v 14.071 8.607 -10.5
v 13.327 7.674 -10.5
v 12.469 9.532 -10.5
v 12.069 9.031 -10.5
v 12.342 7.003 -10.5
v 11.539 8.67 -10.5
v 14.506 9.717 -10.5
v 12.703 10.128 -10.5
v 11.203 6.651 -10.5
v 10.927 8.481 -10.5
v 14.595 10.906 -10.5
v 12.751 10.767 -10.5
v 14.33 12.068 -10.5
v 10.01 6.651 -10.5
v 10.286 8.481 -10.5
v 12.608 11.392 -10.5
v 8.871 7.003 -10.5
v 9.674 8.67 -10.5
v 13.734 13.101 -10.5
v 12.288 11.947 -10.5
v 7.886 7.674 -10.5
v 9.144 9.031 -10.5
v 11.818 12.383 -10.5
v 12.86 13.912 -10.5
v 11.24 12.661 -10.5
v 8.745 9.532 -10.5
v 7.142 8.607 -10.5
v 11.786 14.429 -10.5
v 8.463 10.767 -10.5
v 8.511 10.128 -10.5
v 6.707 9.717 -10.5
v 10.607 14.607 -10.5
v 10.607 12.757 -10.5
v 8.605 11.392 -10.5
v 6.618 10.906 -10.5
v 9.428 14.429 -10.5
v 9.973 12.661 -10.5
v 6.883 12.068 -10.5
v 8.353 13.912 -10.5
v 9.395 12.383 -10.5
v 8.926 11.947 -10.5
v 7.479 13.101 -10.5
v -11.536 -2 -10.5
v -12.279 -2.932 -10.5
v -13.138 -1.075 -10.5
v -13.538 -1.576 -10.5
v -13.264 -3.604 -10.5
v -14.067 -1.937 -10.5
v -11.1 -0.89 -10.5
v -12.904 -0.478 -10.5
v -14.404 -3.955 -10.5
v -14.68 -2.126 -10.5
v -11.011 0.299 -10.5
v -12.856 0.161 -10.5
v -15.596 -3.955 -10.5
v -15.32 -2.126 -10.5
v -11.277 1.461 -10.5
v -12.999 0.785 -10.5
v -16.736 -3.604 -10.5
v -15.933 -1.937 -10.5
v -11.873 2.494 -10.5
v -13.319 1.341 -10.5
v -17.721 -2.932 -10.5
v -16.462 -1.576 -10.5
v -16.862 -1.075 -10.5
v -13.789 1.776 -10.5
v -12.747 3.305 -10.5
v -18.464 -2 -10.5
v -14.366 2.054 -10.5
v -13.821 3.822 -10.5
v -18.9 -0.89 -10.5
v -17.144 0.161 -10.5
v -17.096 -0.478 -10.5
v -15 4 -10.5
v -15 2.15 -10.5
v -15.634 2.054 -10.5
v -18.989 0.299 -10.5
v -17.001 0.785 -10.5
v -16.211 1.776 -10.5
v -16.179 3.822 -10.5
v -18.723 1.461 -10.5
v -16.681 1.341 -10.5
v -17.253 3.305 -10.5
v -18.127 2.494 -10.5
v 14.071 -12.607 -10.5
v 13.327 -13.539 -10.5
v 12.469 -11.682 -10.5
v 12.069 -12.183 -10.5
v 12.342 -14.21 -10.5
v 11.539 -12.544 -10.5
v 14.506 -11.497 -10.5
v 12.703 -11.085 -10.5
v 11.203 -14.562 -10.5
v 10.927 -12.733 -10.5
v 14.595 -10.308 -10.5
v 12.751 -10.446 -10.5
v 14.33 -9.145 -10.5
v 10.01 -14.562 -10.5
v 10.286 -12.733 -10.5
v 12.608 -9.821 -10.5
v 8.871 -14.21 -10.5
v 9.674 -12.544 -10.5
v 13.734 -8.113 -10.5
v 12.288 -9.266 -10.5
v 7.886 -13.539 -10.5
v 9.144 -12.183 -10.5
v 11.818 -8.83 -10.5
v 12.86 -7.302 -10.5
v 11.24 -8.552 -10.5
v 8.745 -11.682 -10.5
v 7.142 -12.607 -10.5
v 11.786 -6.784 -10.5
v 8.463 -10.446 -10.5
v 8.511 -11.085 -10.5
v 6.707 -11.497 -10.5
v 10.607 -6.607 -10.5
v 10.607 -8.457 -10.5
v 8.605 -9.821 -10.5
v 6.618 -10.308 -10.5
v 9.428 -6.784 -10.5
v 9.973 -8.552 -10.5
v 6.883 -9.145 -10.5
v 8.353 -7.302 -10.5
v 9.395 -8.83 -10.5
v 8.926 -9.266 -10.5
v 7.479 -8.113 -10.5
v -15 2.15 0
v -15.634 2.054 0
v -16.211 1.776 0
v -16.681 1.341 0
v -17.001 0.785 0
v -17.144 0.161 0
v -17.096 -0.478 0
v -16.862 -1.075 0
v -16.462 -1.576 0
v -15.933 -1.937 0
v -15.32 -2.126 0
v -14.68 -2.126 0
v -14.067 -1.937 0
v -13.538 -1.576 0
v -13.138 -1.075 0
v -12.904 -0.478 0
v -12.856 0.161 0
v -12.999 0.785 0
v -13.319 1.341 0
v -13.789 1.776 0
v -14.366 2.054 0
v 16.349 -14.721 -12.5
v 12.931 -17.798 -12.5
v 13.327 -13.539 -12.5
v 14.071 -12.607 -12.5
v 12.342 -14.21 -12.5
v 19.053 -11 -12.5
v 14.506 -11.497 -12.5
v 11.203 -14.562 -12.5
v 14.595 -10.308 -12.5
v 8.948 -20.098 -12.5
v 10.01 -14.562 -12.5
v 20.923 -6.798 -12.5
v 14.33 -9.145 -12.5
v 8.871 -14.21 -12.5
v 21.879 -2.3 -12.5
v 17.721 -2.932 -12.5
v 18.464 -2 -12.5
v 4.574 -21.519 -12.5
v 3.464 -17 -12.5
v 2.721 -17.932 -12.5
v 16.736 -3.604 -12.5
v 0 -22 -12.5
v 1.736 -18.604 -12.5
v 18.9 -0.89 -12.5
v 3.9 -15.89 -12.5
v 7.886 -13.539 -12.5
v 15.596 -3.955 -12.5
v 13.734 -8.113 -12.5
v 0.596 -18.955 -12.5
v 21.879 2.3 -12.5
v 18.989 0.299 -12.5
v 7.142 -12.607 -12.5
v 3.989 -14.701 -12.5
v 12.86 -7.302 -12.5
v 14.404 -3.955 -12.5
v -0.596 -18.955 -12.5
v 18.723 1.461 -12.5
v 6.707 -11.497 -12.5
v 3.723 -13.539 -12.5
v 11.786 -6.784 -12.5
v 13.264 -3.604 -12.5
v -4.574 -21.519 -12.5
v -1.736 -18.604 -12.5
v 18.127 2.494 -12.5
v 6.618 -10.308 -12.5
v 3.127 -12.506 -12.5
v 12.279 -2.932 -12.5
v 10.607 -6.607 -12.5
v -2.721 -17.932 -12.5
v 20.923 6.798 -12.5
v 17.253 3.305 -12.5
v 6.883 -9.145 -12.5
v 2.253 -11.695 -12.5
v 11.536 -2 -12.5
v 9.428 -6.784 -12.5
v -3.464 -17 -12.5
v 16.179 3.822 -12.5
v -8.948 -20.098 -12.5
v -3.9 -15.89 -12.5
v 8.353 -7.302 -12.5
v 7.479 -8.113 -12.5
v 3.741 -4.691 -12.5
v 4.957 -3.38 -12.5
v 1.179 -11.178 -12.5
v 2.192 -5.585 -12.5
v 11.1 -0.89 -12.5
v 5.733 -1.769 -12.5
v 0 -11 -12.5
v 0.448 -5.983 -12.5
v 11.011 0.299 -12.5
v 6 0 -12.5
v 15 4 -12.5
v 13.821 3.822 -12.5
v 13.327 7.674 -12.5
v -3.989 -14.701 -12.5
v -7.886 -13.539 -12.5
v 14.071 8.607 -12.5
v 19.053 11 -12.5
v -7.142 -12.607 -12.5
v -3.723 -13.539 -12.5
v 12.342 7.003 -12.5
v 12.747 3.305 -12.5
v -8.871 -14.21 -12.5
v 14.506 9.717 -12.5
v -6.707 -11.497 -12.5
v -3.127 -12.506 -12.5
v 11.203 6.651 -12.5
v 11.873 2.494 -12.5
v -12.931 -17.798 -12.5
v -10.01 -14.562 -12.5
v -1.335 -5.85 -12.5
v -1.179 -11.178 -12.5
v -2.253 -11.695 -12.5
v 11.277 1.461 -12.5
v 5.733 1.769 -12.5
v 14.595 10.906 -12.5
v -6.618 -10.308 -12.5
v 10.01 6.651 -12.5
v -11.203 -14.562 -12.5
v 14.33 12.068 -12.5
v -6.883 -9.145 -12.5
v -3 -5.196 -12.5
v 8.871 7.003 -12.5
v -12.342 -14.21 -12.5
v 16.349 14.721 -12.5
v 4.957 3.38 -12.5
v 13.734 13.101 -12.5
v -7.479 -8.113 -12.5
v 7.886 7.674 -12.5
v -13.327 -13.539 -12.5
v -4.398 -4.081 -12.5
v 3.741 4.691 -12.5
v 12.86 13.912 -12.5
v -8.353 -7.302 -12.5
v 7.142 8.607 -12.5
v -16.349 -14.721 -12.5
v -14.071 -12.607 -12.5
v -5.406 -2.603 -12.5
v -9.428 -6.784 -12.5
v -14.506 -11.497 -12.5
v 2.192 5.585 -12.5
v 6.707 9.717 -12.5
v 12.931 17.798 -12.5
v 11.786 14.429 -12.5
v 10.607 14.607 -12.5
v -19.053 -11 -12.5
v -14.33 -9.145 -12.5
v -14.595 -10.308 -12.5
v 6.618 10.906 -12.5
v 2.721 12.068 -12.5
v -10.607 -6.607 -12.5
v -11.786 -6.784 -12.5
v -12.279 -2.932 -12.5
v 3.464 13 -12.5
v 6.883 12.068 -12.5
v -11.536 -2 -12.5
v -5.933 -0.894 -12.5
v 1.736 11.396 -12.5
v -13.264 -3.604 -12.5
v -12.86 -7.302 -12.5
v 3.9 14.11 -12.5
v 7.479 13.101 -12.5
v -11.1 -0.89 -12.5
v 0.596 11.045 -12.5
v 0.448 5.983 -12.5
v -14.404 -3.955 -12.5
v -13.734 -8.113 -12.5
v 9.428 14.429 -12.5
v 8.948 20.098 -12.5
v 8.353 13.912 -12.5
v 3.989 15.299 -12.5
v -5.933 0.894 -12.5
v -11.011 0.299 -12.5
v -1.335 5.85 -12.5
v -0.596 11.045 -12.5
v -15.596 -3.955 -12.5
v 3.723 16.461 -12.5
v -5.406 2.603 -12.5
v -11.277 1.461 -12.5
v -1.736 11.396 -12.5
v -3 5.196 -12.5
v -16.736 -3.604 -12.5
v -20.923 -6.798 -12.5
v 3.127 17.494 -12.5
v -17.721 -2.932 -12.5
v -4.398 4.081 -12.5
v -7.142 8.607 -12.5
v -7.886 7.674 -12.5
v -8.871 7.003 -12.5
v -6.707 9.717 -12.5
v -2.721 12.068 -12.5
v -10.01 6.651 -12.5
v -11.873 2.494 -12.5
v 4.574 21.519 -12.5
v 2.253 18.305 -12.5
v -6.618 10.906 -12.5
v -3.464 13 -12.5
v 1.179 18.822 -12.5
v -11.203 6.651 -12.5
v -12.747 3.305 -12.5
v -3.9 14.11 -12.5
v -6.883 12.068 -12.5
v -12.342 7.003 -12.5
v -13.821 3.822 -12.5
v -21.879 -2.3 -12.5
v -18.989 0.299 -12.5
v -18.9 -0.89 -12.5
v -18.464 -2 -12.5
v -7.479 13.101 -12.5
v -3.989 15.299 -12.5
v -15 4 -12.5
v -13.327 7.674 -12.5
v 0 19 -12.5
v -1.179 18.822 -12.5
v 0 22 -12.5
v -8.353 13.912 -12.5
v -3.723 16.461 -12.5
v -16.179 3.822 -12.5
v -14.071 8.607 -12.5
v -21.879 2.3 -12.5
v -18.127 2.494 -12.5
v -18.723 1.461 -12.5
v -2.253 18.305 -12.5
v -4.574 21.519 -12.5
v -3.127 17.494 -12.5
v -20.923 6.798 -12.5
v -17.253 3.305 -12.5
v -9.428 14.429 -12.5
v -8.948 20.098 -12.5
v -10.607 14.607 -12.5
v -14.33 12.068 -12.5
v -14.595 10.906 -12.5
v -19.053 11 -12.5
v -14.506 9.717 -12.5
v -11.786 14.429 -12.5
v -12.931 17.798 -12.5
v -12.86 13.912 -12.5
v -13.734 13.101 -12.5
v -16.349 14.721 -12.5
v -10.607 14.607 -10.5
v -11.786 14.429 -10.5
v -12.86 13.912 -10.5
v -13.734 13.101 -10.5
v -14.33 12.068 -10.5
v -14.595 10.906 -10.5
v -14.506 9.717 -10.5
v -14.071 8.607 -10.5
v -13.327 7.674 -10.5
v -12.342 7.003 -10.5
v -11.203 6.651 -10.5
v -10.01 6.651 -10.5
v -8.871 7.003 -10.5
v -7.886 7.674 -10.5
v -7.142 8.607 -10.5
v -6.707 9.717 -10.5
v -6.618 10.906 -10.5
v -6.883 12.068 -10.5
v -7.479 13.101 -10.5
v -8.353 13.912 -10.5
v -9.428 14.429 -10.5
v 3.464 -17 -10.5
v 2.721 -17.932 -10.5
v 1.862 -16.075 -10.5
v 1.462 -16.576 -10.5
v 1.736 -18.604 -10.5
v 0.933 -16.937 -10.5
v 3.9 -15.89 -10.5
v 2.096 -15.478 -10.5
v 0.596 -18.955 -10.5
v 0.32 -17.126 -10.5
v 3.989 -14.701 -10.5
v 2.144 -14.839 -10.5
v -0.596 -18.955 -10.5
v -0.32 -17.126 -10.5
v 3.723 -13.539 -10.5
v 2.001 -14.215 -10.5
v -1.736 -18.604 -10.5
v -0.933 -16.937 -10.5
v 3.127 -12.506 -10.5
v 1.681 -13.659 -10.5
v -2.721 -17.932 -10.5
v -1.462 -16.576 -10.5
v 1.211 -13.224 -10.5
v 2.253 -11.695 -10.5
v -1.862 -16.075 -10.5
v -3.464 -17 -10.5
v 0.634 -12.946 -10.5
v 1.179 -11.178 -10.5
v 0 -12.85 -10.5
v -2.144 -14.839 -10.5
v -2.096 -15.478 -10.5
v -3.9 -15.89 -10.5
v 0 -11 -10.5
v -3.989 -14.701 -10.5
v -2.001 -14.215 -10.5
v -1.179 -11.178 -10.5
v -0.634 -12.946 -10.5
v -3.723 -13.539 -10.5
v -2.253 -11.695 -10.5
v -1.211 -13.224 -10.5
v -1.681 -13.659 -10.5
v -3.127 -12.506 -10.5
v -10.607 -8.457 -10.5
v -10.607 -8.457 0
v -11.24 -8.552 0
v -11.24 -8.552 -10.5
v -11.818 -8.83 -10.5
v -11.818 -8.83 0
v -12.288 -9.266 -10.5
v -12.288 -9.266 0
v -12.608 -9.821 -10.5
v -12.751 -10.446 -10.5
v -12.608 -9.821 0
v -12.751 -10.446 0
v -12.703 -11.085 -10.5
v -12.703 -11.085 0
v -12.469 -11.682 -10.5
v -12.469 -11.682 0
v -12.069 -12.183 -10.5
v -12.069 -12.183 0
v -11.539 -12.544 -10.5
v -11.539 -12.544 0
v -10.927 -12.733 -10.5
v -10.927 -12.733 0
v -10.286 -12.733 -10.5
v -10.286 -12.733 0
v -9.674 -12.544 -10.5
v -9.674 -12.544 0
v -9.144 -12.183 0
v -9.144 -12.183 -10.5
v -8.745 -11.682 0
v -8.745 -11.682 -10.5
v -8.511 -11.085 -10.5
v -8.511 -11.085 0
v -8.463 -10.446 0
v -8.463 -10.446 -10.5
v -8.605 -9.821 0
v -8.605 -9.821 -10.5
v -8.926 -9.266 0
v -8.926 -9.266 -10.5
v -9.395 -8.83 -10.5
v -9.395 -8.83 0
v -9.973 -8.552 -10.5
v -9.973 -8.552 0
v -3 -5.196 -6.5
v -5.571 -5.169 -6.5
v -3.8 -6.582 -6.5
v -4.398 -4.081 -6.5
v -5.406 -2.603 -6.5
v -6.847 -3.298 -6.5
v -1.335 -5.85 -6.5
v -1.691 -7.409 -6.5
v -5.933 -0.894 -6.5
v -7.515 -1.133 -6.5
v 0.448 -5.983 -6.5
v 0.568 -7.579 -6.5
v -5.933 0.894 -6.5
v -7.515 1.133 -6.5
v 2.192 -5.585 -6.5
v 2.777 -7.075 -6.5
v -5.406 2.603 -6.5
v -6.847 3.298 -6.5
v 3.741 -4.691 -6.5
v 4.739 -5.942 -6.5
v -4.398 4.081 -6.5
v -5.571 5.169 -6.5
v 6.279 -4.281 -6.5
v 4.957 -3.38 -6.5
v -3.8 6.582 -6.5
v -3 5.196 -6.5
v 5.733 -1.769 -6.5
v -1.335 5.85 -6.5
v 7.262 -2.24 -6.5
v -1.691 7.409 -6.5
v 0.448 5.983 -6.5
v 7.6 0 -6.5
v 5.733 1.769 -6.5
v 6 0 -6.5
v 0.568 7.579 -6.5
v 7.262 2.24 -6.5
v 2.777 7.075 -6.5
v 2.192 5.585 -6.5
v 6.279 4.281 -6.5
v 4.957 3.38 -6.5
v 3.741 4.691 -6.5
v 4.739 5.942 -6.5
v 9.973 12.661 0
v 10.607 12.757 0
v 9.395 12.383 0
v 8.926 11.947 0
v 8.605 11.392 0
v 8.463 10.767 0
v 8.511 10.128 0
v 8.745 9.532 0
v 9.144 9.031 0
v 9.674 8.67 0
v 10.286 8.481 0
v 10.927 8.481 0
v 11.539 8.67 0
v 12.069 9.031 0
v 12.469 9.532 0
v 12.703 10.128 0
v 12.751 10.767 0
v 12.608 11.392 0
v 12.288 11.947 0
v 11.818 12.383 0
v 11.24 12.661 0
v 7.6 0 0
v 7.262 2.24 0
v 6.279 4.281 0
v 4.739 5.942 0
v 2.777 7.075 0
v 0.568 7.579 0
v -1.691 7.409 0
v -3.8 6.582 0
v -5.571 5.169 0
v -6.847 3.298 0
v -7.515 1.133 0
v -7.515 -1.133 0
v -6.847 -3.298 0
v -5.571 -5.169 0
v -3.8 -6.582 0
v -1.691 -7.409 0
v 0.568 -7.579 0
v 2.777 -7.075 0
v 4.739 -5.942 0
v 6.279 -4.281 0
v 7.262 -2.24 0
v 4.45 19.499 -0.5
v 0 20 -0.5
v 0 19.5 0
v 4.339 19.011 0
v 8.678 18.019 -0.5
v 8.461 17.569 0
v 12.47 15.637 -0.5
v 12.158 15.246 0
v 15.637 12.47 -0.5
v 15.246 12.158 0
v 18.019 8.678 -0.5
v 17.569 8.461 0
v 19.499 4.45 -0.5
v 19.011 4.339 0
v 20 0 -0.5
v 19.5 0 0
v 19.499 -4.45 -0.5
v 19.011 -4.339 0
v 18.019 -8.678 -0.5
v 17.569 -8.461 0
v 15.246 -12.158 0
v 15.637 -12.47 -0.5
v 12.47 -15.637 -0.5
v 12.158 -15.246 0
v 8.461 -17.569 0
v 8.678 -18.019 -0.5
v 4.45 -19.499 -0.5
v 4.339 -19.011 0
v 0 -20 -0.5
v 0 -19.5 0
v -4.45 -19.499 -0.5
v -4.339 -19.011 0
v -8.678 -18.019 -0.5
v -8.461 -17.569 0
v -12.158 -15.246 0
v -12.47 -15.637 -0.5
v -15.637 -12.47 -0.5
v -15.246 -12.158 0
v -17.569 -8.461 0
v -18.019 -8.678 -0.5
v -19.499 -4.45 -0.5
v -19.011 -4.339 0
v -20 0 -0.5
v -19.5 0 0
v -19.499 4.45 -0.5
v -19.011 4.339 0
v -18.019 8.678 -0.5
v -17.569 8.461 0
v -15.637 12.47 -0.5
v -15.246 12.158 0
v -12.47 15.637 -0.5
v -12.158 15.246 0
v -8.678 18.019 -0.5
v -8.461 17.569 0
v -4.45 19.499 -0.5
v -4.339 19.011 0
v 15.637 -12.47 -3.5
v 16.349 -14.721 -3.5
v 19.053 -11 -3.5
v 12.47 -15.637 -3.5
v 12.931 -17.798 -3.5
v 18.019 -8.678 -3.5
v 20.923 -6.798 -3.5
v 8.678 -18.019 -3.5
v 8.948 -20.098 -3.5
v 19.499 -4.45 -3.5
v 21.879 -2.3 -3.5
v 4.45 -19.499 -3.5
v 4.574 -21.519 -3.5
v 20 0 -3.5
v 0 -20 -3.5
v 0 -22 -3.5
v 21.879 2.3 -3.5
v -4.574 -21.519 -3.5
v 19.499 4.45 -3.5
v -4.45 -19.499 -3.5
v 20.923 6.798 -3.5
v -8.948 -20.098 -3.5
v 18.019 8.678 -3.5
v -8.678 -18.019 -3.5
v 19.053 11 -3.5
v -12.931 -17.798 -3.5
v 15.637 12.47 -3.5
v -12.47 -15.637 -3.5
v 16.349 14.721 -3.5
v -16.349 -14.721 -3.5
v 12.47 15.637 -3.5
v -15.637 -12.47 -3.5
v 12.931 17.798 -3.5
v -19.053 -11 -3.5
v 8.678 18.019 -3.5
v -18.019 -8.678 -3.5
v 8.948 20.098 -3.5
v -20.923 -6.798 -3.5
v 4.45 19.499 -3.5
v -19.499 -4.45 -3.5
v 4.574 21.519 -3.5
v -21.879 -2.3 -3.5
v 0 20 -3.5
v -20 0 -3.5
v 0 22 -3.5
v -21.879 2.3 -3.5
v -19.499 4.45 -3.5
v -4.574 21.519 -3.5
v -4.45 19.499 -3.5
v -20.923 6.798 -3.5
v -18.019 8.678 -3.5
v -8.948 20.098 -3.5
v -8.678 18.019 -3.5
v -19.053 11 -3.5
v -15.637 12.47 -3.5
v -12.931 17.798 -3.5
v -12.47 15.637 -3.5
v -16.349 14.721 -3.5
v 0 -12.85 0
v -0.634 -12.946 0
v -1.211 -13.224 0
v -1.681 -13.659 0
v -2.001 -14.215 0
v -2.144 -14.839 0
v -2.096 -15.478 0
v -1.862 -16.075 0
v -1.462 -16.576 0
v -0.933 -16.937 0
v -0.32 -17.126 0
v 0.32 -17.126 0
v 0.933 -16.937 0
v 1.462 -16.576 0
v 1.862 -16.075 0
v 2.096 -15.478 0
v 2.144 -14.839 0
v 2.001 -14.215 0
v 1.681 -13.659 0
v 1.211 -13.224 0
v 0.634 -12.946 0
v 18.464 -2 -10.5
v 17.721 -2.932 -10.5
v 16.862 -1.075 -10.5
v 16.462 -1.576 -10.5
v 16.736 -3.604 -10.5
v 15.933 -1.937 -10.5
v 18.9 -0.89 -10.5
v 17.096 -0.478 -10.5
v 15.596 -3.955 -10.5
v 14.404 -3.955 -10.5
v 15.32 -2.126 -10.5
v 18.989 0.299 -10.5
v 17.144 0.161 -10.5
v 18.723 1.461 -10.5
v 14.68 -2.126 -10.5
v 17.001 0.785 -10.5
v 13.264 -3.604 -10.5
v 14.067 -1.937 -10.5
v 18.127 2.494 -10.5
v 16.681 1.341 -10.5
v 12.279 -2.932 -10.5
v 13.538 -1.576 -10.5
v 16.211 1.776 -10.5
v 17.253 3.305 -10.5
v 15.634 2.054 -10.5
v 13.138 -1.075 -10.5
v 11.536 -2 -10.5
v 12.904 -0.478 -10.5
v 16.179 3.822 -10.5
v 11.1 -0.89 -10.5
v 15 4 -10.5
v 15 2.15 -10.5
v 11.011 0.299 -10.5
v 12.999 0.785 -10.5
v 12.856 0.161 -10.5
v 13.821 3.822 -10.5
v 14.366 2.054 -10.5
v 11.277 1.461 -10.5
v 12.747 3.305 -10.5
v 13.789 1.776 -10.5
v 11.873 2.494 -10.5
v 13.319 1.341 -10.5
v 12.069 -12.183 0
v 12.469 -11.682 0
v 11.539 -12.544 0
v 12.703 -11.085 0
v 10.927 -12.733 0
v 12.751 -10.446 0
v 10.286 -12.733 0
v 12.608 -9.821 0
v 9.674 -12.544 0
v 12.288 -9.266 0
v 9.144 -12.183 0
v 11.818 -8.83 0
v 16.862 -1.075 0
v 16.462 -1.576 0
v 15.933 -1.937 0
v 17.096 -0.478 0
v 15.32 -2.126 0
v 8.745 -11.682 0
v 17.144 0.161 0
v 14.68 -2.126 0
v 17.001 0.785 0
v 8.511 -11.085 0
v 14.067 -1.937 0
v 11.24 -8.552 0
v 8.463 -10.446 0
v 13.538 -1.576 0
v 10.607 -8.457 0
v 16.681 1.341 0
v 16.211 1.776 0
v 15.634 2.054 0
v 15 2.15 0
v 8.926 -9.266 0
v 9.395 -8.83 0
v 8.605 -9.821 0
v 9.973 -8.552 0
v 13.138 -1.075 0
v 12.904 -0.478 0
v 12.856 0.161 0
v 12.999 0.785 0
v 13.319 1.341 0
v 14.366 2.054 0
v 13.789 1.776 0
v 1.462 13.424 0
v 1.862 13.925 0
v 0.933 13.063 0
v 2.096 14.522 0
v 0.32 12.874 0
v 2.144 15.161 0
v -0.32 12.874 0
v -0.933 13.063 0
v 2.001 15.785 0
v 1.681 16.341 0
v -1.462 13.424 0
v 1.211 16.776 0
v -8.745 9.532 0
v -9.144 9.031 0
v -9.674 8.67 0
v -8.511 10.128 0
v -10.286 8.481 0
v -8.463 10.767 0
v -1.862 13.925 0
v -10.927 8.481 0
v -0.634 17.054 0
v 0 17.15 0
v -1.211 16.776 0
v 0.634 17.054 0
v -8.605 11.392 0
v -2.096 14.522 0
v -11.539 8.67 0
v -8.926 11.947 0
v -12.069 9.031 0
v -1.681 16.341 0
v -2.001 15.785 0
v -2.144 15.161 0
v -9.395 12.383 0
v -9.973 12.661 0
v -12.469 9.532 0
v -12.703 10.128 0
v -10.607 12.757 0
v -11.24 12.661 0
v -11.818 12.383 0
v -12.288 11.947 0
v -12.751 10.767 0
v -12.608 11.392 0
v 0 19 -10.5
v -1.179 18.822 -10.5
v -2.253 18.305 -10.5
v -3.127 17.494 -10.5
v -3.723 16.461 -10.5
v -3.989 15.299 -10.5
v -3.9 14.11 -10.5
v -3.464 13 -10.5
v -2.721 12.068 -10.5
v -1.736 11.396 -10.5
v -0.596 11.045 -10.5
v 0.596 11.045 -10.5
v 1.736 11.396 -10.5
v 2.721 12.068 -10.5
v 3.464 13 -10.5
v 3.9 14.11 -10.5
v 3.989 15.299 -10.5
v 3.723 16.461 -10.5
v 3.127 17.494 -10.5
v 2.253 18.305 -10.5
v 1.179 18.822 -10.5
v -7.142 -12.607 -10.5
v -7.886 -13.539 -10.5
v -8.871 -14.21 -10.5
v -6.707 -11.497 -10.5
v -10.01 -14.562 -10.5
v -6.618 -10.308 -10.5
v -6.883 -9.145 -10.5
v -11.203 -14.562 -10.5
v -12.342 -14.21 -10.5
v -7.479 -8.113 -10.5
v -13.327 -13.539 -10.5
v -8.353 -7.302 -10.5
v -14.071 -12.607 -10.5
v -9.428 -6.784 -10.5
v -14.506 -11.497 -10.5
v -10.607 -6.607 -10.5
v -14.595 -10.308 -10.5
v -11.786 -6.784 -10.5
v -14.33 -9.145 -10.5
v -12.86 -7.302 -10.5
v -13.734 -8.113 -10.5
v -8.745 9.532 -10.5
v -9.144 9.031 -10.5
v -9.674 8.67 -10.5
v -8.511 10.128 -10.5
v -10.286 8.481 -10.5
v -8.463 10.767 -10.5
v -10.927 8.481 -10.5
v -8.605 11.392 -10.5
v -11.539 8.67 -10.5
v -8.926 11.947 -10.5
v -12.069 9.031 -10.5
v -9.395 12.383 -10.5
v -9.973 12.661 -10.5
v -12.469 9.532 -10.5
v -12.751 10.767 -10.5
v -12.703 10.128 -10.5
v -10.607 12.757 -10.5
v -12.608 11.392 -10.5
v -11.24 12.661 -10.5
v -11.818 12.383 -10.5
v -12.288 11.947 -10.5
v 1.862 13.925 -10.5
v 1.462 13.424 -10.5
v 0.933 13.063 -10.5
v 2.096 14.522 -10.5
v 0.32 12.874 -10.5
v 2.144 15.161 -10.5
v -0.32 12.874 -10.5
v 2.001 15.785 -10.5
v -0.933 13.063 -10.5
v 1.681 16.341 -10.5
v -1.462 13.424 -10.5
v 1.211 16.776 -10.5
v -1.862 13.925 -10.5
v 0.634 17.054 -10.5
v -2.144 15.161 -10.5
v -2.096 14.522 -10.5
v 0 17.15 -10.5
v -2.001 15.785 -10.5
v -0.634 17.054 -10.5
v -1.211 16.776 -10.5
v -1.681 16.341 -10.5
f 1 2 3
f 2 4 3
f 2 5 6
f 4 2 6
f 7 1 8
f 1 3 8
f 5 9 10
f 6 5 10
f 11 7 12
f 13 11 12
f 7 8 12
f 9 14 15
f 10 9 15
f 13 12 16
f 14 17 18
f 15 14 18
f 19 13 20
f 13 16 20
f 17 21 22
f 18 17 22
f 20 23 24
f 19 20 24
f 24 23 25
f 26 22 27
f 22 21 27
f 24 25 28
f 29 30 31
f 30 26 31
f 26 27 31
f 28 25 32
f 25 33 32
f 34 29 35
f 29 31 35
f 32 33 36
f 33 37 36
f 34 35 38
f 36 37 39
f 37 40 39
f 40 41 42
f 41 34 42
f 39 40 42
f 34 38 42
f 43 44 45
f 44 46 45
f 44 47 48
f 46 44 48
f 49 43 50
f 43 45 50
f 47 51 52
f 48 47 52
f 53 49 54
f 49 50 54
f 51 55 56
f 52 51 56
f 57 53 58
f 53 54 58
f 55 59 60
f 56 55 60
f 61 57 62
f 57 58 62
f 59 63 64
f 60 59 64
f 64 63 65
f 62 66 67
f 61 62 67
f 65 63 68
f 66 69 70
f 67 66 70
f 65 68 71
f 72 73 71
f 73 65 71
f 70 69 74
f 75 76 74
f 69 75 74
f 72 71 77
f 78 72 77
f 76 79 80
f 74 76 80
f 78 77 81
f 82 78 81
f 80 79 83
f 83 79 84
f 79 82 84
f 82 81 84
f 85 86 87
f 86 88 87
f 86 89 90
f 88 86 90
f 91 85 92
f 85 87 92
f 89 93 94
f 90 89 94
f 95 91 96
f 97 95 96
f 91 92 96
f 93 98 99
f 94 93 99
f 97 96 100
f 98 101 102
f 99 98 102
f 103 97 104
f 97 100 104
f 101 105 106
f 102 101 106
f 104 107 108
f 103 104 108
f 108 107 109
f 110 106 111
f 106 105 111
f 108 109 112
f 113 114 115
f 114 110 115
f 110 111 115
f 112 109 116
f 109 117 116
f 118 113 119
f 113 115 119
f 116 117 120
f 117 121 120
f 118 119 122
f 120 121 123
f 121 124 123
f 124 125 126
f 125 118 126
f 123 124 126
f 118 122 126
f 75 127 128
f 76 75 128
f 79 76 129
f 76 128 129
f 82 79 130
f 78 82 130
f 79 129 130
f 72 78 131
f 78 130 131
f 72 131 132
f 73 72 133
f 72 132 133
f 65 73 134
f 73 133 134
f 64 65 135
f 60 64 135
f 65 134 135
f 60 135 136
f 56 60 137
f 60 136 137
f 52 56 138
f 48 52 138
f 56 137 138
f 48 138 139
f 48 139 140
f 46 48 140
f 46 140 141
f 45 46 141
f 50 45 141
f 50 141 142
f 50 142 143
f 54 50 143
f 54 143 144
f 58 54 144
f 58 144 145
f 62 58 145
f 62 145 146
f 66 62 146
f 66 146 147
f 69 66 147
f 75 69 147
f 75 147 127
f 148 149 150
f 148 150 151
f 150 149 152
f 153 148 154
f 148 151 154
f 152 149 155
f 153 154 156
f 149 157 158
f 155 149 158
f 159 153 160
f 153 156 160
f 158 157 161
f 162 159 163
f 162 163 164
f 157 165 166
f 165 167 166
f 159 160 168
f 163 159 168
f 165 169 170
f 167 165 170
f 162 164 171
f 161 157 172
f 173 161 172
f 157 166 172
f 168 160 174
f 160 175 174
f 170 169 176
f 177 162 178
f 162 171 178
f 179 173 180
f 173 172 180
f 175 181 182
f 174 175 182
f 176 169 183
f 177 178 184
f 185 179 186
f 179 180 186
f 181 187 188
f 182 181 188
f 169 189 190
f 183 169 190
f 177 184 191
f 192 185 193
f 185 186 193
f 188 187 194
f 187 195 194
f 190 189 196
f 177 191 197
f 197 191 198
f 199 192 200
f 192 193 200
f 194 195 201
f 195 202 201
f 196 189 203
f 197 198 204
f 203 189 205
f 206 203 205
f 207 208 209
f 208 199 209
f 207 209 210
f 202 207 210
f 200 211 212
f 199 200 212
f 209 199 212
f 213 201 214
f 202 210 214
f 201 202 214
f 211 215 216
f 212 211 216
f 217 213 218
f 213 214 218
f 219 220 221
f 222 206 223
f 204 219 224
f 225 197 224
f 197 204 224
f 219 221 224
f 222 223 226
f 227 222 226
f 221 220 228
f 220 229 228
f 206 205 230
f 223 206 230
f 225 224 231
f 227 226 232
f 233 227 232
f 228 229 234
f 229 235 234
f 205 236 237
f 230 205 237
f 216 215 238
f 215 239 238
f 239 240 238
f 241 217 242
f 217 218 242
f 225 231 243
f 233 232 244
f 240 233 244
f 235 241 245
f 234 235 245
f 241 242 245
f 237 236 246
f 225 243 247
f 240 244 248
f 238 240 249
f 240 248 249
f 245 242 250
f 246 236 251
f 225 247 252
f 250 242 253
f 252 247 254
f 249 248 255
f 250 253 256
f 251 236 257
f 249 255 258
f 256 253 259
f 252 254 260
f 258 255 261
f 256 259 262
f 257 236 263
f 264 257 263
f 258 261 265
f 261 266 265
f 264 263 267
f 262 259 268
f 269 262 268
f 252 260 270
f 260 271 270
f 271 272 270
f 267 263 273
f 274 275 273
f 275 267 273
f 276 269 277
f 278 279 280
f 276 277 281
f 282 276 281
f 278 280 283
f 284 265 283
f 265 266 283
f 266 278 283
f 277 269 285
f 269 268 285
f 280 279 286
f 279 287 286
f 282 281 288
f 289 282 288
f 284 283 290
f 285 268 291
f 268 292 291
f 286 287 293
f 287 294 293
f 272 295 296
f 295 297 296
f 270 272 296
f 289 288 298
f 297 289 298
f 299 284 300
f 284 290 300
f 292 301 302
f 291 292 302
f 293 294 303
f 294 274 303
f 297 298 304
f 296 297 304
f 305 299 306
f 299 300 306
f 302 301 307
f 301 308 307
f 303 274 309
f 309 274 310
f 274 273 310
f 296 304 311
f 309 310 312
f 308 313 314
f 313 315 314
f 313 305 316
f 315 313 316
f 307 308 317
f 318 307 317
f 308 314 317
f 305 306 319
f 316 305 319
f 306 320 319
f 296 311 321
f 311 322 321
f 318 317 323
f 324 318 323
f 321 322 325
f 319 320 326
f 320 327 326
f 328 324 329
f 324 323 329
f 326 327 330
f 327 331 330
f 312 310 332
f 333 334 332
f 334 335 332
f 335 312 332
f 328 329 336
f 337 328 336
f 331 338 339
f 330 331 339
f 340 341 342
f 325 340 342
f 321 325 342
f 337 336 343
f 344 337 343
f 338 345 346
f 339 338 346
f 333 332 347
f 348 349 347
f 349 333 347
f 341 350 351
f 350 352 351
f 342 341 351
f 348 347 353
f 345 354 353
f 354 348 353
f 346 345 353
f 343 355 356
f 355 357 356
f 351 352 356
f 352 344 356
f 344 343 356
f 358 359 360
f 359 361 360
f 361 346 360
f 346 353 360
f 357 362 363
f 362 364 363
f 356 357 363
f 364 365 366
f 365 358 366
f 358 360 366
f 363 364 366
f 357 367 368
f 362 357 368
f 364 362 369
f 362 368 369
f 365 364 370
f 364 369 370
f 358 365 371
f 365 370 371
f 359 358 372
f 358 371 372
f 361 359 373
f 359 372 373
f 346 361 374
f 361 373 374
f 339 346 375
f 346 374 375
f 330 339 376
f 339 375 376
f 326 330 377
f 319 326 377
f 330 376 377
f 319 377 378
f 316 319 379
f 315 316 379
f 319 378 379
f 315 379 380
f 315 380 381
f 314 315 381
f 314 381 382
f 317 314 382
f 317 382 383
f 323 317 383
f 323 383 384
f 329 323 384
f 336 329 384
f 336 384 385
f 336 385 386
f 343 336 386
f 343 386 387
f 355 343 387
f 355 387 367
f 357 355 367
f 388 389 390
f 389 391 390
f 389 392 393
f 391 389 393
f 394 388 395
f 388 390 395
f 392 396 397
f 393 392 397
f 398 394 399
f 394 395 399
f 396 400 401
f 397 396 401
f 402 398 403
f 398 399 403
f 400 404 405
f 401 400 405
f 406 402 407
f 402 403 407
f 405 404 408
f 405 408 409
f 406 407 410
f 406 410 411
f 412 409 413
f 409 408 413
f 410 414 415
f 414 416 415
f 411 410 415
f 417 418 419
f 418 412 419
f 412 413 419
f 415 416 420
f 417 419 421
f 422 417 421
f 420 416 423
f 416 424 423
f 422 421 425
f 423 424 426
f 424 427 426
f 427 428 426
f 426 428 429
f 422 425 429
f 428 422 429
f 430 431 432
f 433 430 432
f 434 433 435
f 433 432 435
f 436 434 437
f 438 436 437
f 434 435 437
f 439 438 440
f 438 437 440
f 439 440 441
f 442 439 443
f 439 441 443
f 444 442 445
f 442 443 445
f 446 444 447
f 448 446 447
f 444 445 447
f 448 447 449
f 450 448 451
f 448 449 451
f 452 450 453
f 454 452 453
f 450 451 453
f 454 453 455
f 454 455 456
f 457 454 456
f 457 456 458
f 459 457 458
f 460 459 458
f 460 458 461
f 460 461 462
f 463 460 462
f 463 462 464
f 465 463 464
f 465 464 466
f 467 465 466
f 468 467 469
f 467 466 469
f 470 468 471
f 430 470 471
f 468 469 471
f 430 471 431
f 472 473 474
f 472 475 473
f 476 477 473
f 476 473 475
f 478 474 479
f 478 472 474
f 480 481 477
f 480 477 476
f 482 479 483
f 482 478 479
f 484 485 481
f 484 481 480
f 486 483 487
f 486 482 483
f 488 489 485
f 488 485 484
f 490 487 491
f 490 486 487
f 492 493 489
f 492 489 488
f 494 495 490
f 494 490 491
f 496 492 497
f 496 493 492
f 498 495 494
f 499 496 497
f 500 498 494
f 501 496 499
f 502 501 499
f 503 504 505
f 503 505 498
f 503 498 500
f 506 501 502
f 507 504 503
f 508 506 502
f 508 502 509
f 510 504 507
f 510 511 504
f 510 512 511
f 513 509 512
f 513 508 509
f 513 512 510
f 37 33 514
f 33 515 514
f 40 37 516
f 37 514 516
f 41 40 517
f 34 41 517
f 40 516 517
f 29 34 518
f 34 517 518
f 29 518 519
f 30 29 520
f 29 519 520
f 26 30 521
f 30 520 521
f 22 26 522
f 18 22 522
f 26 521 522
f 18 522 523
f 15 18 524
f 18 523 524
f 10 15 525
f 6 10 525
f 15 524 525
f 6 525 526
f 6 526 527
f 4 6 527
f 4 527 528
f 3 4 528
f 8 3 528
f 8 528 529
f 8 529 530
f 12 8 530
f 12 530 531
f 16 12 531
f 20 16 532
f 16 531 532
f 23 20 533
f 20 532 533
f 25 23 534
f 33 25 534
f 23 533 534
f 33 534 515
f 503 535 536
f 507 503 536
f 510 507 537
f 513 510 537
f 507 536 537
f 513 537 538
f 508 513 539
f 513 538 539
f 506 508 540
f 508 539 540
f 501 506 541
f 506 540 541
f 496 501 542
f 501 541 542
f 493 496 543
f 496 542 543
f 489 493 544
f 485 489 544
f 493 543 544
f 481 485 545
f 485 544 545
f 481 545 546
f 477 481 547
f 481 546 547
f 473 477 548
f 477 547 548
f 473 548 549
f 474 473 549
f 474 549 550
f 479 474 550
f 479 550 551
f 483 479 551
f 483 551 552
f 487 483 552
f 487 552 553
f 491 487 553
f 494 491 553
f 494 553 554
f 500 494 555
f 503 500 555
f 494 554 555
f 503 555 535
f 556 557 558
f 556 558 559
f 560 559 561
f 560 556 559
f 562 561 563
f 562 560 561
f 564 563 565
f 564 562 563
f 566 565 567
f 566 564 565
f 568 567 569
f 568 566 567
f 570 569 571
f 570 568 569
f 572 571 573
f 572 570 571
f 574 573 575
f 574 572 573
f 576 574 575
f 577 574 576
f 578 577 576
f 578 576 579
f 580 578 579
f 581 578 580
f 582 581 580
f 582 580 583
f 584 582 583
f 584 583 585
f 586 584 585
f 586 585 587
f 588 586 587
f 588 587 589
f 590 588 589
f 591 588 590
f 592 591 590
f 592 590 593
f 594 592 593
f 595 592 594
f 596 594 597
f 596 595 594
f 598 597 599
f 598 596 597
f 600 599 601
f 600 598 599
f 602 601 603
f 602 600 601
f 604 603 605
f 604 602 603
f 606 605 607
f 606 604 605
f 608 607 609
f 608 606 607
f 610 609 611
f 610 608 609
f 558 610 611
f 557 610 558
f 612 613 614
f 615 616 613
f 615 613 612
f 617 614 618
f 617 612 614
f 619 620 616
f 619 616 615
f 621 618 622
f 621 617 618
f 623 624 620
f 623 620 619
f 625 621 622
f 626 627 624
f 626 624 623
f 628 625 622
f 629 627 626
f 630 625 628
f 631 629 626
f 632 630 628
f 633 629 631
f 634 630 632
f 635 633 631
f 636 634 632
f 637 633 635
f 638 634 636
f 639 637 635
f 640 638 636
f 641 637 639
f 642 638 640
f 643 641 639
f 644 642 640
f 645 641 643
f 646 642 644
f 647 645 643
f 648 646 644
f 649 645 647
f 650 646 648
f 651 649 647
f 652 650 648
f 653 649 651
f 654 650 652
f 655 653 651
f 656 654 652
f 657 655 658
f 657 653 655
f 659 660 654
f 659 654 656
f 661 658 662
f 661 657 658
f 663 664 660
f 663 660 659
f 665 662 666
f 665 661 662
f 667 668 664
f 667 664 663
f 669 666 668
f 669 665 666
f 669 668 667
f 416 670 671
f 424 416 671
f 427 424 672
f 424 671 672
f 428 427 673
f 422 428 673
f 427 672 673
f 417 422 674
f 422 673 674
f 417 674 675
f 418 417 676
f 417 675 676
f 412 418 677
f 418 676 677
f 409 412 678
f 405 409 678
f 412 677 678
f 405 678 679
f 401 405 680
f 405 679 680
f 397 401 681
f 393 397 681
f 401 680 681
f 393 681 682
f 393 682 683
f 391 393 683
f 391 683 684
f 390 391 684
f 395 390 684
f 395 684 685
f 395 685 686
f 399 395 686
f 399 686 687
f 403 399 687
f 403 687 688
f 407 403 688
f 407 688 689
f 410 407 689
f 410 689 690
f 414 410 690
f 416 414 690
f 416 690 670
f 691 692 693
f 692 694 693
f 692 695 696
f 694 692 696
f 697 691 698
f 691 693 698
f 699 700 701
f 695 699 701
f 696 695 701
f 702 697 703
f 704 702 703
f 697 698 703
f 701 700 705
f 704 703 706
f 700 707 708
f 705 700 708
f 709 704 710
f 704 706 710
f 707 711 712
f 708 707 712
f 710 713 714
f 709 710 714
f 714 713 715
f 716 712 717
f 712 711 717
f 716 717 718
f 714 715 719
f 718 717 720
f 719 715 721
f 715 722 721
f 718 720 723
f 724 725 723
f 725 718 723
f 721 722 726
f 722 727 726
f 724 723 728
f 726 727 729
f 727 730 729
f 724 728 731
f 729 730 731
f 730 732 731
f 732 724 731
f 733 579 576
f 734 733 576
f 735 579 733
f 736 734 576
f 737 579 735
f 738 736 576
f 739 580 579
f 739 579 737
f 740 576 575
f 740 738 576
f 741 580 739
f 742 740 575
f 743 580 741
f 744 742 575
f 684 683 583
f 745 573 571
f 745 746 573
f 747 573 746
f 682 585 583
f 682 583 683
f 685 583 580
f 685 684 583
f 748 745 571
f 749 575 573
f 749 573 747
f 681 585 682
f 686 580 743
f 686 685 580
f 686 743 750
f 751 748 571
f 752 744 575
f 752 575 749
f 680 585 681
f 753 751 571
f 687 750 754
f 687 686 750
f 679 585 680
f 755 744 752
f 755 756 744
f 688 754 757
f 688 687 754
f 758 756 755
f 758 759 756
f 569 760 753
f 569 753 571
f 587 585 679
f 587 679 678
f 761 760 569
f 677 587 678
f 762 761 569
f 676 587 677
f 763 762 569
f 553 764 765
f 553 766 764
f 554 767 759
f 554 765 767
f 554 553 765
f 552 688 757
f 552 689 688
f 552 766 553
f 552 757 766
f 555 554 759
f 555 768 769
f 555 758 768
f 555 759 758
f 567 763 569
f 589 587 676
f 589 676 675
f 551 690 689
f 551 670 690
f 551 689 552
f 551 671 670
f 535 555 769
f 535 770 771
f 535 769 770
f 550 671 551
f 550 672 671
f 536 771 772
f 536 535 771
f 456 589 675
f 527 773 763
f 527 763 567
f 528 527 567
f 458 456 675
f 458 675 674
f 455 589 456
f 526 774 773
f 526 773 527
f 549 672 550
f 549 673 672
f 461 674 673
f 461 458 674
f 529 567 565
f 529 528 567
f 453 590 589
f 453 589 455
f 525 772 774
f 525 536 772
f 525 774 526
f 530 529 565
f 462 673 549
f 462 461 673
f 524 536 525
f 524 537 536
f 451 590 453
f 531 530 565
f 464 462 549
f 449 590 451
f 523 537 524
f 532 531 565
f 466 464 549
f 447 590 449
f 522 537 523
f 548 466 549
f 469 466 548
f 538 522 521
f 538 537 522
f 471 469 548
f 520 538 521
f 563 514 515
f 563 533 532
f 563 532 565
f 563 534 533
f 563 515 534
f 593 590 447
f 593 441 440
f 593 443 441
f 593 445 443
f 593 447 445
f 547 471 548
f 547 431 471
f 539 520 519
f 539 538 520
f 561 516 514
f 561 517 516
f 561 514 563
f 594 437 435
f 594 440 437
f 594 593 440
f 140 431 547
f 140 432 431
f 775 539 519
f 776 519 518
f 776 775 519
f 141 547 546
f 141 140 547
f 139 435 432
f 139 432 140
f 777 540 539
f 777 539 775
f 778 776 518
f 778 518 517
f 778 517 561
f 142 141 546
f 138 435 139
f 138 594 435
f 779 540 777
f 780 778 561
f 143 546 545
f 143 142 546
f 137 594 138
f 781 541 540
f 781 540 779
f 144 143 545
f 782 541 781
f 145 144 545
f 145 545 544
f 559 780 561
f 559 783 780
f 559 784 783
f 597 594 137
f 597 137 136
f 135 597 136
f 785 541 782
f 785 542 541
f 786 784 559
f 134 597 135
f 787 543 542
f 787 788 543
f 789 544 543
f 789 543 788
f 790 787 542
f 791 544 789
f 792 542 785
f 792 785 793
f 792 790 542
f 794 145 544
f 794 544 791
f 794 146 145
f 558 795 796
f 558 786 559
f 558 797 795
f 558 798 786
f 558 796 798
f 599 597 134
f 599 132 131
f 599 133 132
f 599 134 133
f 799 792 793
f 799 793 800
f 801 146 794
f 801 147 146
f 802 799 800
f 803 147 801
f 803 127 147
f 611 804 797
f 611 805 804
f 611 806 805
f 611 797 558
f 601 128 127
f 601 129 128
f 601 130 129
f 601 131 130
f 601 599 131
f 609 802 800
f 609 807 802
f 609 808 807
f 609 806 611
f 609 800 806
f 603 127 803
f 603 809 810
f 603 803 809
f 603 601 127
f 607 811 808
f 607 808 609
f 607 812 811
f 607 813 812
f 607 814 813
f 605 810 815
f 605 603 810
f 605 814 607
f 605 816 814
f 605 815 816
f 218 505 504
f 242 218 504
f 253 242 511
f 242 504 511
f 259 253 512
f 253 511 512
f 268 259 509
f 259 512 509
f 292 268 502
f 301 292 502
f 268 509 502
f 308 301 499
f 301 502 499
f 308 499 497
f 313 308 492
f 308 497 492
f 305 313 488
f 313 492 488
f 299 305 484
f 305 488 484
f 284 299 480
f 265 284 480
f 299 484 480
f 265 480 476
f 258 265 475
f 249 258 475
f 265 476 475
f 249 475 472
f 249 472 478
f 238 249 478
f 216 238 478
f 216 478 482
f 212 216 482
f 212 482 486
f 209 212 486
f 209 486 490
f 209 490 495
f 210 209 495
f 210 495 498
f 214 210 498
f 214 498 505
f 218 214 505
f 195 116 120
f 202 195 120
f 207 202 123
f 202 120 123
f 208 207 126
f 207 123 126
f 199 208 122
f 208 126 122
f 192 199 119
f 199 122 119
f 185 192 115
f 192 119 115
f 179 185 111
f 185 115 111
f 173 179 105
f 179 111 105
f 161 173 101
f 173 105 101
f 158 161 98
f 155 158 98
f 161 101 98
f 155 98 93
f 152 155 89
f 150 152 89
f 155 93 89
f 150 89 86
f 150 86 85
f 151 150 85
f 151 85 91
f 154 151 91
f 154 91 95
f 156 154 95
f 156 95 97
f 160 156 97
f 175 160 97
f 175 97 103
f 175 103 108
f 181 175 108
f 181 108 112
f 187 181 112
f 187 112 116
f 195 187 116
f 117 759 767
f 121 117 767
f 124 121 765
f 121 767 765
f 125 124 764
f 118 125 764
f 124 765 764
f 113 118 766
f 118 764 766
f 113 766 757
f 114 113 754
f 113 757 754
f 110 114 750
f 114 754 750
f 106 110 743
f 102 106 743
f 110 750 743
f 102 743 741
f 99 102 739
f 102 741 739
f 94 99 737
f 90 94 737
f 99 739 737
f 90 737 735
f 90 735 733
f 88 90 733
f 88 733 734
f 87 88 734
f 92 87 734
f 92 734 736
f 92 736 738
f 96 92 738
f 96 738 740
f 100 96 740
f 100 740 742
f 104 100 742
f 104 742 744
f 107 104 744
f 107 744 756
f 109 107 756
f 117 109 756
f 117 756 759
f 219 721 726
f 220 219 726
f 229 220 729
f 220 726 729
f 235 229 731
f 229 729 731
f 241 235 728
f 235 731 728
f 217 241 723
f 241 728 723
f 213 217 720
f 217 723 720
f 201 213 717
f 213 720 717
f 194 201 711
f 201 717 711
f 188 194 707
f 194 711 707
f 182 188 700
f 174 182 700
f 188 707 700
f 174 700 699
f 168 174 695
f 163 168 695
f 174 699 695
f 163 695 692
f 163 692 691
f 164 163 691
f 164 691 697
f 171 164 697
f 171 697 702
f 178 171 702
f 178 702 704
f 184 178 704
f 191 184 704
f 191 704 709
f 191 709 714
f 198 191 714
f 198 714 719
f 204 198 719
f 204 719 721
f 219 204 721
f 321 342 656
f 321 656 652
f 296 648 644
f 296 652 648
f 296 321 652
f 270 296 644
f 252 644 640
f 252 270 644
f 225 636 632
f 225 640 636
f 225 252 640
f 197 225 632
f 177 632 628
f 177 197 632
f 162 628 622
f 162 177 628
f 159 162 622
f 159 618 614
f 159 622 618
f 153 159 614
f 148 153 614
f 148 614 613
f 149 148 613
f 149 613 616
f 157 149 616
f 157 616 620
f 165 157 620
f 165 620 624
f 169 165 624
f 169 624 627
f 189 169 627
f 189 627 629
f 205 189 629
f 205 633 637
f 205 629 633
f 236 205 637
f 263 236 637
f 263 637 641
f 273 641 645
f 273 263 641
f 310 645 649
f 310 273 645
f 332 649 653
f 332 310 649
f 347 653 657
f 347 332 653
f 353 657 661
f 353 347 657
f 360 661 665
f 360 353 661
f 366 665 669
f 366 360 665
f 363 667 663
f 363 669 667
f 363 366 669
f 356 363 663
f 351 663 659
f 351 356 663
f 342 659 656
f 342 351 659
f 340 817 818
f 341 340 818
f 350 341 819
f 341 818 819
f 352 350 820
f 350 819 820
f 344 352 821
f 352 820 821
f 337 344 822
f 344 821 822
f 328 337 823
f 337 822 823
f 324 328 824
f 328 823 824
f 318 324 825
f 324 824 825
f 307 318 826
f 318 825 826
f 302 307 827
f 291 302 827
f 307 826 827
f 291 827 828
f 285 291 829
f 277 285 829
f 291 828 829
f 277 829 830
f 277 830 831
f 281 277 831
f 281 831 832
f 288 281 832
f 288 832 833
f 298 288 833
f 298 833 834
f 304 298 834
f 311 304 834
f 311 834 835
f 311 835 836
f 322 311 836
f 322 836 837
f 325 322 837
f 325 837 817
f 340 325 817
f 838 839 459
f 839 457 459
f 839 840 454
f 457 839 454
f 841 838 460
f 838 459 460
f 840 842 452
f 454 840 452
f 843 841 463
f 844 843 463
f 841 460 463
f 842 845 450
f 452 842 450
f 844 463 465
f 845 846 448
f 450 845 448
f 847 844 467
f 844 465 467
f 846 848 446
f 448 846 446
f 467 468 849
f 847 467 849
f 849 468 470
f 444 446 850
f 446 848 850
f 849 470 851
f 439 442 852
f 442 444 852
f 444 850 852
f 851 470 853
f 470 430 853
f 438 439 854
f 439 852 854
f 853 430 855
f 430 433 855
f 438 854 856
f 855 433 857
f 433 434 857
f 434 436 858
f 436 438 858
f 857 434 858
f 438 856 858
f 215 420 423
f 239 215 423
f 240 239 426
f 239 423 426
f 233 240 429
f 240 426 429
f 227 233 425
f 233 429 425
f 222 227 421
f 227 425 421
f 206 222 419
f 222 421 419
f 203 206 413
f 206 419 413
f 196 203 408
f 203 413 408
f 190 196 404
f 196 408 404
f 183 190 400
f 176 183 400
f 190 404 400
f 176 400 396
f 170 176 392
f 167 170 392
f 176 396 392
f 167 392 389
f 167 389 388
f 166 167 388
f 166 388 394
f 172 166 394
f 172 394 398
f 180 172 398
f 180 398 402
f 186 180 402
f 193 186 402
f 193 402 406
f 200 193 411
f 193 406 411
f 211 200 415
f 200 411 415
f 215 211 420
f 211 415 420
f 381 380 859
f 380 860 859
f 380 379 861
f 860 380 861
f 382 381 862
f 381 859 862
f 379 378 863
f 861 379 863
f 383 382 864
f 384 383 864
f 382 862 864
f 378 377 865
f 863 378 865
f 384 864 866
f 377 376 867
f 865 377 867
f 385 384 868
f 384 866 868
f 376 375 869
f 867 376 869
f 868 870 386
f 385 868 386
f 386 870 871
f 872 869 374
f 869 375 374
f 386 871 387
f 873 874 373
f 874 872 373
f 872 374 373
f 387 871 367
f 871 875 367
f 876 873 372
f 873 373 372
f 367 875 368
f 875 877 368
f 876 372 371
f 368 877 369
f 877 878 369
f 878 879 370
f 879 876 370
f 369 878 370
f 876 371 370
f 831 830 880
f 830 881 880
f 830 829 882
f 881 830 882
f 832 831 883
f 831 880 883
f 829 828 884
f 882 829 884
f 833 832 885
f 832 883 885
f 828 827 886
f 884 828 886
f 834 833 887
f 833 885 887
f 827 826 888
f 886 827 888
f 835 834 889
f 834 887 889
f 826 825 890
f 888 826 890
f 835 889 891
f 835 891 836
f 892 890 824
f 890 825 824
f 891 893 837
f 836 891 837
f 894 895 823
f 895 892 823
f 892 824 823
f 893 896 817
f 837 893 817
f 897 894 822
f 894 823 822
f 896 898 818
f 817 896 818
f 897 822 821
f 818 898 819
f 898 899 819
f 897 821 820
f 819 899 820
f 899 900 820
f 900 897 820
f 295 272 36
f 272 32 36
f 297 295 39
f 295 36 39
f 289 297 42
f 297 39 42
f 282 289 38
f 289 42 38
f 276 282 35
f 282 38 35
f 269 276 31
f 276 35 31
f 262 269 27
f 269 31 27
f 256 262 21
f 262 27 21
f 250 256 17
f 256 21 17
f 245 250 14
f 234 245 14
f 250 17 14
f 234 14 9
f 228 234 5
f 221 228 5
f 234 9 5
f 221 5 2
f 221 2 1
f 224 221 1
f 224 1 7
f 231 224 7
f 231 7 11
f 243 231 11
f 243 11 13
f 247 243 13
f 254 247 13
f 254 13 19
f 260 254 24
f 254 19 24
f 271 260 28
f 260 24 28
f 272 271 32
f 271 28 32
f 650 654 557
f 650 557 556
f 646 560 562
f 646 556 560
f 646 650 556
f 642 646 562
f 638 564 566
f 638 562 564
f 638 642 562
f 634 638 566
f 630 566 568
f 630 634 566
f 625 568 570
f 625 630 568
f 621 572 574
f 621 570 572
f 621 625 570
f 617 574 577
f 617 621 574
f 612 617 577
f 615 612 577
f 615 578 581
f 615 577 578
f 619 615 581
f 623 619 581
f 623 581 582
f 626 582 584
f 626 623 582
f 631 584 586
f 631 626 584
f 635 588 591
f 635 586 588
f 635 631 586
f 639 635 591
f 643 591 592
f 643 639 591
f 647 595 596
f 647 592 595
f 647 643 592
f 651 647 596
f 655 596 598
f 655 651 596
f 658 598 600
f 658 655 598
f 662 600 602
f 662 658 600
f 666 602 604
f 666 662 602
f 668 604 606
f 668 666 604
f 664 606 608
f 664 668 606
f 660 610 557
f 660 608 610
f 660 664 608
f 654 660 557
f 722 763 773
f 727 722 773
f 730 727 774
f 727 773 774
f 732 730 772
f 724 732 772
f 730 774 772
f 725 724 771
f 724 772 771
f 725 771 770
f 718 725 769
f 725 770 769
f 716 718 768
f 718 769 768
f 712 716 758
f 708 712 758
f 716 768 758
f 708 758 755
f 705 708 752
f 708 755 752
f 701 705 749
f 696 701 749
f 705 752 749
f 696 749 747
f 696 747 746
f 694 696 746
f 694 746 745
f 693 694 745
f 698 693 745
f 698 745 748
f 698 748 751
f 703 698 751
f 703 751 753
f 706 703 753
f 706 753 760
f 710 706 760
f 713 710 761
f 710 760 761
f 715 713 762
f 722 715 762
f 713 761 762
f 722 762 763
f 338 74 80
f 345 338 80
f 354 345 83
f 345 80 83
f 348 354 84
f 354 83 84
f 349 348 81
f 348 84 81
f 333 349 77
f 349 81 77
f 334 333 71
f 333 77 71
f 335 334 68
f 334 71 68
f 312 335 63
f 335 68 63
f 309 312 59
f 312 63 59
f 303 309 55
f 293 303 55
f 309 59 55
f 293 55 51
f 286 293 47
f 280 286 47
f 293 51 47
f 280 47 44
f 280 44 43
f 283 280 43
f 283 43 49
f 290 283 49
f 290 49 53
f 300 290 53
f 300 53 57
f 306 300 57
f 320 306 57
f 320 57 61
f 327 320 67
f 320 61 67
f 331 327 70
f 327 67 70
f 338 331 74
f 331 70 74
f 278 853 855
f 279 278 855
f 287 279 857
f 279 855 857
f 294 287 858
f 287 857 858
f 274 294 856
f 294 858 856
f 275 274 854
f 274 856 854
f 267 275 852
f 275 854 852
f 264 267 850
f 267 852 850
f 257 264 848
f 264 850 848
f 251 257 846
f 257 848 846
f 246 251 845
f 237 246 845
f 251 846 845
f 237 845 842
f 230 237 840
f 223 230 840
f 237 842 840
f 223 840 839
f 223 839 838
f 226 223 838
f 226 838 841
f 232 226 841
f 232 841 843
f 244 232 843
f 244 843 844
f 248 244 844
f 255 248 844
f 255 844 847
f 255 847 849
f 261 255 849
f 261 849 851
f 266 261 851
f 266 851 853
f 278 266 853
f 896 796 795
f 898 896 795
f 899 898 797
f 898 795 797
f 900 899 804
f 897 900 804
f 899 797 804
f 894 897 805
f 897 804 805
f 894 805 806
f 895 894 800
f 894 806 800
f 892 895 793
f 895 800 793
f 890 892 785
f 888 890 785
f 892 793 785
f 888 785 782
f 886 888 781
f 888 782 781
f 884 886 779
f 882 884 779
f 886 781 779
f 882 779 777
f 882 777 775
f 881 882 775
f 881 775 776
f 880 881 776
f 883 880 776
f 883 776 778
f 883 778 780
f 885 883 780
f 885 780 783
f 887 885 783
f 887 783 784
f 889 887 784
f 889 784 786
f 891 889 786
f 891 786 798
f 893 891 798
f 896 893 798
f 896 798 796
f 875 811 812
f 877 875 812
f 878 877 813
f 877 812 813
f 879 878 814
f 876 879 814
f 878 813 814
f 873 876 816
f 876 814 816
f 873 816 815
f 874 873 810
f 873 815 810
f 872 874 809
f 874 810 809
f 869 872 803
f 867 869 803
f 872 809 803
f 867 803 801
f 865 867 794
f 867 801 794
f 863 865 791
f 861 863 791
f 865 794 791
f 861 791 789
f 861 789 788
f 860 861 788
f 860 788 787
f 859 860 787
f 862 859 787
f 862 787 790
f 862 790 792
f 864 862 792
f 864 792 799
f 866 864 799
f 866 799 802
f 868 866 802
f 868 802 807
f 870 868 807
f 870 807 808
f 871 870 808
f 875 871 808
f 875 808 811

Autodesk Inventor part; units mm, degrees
ref_plane "YZ Plane" through (0, 0, 0) normal (1, 0, 0) x (0, 1, 0)
ref_plane "XZ Plane" through (0, 0, 0) normal (0, 1, 0) x (-1, 0, 0)
ref_plane "XY Plane" through (0, 0, 0) normal (0, 0, 1) x (1, 0, 0)
sketch "スケッチ1" plane through (0, 0, 0) normal (1, 0, 0) x (0, 1, 0)
  line L0 (0, 0) -> (20, 0)
  line L1 (20, 0) -> (20, -3.5)
  line L2 (20, -3.5) -> (22, -3.5)
  line L3 (22, -3.5) -> (22, -12.5)
  line L4 (22, -12.5) -> (0, -12.5)
  line L5 (0, -12.5) -> (0, 0)
  line L6 (12, 0) -> (12, -12.5)
  dimension "d0" = 20
  dimension "d1" = 2
  dimension "d23" = 12
  dimension "d35" = 3.5
  dimension "d40" = 9
revolve "回転1" add sketch "スケッチ1" angle 360 about axis through (0, 0, -12.5) along (0, 0, 1)
chamfer "面取り1" distance 0.5 angle 45 1 edges at (0, -20, 0)
sketch "スケッチ4" plane through (0, 0, -12.5) normal (0, 0, -1) x (-1, 0, 0)
  circle A0 centre (0, 0) radius 15
  point P0 (0, 15)
  point P1 (-10.6066, 10.6066)
  point P2 (-15, 0)
  point P3 (-10.6066, -10.6066)
  point P4 (0, -15)
  point P5 (10.6066, -10.6066)
  point P6 (15, 0)
  point P7 (10.6066, 10.6066)
  dimension "d41" = 30
  dimension "d44" = 360
hole "穴2" at (-10.6066, 10.6066, -12.5) at (-15, 0, -12.5) at (-10.6066, -10.6066, -12.5) at (0, -15, -12.5) at (10.6066, -10.6066, -12.5) at (15, 0, -12.5) at (10.6066, 10.6066, -12.5) at (0, 15, -12.5) direction (0, 0, 1) diameter 4.3 end through all counterbore diameter 8 counterbore depth 2 clearance for "Socket Head Cap Screw" size "M4" standard "Ansi Metric M Profile"
sketch "スケッチ6" plane through (0, 0, 0) normal (0, 0, 1) x (1, 0, 0)
  circle A0 centre (0, 0) radius 7.6
  point P0 (0, 0)
  dimension "d46" = 15.2
extrude "押し出し3" cut sketch "スケッチ6" against normal blind 6.5
sketch "スケッチ7" plane through (0, 0, -6.5) normal (0, 0, 1) x (1, 0, 0)
  circle A0 centre (0, 0) radius 6
  point P0 (0, 0)
  dimension "d49" = 12
extrude "押し出し4" cut sketch "スケッチ7" against normal through all
properties part number "scara-base16" material "ABS プラスチック"
